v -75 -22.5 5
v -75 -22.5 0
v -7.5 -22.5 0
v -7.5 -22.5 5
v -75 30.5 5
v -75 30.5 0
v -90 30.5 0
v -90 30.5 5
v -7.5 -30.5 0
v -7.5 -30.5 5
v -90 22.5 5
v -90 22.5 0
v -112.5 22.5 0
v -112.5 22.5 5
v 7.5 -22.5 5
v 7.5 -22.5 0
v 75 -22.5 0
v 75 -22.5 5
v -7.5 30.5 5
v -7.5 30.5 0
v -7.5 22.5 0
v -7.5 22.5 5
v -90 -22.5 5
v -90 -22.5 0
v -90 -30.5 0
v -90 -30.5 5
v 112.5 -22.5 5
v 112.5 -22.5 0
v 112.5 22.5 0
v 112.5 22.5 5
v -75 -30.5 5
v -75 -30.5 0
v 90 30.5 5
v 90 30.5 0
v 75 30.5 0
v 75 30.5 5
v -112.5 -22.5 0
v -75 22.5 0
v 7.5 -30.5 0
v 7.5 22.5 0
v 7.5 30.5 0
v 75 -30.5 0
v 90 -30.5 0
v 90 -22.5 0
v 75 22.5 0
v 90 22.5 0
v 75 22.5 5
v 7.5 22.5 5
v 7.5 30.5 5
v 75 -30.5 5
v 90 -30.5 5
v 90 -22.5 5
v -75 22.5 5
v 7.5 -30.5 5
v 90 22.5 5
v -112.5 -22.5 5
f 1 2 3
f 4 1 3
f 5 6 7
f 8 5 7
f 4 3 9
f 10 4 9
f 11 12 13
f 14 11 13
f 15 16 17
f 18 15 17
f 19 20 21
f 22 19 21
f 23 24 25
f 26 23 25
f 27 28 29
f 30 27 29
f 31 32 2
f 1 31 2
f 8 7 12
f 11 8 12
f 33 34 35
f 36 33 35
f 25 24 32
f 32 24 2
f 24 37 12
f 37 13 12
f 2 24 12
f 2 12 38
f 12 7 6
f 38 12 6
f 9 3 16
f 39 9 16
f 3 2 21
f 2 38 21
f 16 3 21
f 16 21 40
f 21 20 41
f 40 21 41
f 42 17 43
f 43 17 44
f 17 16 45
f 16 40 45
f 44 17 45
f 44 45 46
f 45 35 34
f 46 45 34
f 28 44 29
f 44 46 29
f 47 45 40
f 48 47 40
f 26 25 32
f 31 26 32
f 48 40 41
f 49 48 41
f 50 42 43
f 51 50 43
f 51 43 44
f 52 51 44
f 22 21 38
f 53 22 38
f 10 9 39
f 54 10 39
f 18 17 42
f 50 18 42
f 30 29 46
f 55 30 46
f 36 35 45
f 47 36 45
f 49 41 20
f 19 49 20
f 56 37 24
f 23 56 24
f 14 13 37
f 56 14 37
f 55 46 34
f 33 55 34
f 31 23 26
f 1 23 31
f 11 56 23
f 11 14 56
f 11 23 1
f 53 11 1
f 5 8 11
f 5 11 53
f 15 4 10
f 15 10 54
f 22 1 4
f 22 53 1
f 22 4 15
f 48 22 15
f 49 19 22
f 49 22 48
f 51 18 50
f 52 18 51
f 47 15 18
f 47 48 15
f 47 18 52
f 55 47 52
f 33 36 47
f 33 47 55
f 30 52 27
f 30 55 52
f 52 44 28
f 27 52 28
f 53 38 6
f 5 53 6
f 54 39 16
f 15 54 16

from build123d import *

# Parameters (mm, degrees)
F1_DEPTH = 5


with BuildPart() as f1:
    # F0 (on Top) → F1 (new body)
    with BuildSketch(Plane.XY):
        Polygon((112.5, 0), (-112.5, 0), (-112.5, -22.5), (-90, -22.5), (-90, -30.5), (-75, -30.5), (-75, -22.5), (-7.5, -22.5), (-7.5, -30.5), (7.5, -30.5), (7.5, -22.5), (75, -22.5), (75, -30.5), (90, -30.5), (90, -22.5), (112.5, -22.5), align=None)
        Polygon((-112.5, 22.5), (-112.5, 0), (112.5, 0), (112.5, 22.5), (90, 22.5), (90, 30.5), (75, 30.5), (75, 22.5), (7.5, 22.5), (7.5, 30.5), (-7.5, 30.5), (-7.5, 22.5), (-75, 22.5), (-75, 30.5), (-90, 30.5), (-90, 22.5), align=None)
    extrude(amount=F1_DEPTH)


solid = f1.part
